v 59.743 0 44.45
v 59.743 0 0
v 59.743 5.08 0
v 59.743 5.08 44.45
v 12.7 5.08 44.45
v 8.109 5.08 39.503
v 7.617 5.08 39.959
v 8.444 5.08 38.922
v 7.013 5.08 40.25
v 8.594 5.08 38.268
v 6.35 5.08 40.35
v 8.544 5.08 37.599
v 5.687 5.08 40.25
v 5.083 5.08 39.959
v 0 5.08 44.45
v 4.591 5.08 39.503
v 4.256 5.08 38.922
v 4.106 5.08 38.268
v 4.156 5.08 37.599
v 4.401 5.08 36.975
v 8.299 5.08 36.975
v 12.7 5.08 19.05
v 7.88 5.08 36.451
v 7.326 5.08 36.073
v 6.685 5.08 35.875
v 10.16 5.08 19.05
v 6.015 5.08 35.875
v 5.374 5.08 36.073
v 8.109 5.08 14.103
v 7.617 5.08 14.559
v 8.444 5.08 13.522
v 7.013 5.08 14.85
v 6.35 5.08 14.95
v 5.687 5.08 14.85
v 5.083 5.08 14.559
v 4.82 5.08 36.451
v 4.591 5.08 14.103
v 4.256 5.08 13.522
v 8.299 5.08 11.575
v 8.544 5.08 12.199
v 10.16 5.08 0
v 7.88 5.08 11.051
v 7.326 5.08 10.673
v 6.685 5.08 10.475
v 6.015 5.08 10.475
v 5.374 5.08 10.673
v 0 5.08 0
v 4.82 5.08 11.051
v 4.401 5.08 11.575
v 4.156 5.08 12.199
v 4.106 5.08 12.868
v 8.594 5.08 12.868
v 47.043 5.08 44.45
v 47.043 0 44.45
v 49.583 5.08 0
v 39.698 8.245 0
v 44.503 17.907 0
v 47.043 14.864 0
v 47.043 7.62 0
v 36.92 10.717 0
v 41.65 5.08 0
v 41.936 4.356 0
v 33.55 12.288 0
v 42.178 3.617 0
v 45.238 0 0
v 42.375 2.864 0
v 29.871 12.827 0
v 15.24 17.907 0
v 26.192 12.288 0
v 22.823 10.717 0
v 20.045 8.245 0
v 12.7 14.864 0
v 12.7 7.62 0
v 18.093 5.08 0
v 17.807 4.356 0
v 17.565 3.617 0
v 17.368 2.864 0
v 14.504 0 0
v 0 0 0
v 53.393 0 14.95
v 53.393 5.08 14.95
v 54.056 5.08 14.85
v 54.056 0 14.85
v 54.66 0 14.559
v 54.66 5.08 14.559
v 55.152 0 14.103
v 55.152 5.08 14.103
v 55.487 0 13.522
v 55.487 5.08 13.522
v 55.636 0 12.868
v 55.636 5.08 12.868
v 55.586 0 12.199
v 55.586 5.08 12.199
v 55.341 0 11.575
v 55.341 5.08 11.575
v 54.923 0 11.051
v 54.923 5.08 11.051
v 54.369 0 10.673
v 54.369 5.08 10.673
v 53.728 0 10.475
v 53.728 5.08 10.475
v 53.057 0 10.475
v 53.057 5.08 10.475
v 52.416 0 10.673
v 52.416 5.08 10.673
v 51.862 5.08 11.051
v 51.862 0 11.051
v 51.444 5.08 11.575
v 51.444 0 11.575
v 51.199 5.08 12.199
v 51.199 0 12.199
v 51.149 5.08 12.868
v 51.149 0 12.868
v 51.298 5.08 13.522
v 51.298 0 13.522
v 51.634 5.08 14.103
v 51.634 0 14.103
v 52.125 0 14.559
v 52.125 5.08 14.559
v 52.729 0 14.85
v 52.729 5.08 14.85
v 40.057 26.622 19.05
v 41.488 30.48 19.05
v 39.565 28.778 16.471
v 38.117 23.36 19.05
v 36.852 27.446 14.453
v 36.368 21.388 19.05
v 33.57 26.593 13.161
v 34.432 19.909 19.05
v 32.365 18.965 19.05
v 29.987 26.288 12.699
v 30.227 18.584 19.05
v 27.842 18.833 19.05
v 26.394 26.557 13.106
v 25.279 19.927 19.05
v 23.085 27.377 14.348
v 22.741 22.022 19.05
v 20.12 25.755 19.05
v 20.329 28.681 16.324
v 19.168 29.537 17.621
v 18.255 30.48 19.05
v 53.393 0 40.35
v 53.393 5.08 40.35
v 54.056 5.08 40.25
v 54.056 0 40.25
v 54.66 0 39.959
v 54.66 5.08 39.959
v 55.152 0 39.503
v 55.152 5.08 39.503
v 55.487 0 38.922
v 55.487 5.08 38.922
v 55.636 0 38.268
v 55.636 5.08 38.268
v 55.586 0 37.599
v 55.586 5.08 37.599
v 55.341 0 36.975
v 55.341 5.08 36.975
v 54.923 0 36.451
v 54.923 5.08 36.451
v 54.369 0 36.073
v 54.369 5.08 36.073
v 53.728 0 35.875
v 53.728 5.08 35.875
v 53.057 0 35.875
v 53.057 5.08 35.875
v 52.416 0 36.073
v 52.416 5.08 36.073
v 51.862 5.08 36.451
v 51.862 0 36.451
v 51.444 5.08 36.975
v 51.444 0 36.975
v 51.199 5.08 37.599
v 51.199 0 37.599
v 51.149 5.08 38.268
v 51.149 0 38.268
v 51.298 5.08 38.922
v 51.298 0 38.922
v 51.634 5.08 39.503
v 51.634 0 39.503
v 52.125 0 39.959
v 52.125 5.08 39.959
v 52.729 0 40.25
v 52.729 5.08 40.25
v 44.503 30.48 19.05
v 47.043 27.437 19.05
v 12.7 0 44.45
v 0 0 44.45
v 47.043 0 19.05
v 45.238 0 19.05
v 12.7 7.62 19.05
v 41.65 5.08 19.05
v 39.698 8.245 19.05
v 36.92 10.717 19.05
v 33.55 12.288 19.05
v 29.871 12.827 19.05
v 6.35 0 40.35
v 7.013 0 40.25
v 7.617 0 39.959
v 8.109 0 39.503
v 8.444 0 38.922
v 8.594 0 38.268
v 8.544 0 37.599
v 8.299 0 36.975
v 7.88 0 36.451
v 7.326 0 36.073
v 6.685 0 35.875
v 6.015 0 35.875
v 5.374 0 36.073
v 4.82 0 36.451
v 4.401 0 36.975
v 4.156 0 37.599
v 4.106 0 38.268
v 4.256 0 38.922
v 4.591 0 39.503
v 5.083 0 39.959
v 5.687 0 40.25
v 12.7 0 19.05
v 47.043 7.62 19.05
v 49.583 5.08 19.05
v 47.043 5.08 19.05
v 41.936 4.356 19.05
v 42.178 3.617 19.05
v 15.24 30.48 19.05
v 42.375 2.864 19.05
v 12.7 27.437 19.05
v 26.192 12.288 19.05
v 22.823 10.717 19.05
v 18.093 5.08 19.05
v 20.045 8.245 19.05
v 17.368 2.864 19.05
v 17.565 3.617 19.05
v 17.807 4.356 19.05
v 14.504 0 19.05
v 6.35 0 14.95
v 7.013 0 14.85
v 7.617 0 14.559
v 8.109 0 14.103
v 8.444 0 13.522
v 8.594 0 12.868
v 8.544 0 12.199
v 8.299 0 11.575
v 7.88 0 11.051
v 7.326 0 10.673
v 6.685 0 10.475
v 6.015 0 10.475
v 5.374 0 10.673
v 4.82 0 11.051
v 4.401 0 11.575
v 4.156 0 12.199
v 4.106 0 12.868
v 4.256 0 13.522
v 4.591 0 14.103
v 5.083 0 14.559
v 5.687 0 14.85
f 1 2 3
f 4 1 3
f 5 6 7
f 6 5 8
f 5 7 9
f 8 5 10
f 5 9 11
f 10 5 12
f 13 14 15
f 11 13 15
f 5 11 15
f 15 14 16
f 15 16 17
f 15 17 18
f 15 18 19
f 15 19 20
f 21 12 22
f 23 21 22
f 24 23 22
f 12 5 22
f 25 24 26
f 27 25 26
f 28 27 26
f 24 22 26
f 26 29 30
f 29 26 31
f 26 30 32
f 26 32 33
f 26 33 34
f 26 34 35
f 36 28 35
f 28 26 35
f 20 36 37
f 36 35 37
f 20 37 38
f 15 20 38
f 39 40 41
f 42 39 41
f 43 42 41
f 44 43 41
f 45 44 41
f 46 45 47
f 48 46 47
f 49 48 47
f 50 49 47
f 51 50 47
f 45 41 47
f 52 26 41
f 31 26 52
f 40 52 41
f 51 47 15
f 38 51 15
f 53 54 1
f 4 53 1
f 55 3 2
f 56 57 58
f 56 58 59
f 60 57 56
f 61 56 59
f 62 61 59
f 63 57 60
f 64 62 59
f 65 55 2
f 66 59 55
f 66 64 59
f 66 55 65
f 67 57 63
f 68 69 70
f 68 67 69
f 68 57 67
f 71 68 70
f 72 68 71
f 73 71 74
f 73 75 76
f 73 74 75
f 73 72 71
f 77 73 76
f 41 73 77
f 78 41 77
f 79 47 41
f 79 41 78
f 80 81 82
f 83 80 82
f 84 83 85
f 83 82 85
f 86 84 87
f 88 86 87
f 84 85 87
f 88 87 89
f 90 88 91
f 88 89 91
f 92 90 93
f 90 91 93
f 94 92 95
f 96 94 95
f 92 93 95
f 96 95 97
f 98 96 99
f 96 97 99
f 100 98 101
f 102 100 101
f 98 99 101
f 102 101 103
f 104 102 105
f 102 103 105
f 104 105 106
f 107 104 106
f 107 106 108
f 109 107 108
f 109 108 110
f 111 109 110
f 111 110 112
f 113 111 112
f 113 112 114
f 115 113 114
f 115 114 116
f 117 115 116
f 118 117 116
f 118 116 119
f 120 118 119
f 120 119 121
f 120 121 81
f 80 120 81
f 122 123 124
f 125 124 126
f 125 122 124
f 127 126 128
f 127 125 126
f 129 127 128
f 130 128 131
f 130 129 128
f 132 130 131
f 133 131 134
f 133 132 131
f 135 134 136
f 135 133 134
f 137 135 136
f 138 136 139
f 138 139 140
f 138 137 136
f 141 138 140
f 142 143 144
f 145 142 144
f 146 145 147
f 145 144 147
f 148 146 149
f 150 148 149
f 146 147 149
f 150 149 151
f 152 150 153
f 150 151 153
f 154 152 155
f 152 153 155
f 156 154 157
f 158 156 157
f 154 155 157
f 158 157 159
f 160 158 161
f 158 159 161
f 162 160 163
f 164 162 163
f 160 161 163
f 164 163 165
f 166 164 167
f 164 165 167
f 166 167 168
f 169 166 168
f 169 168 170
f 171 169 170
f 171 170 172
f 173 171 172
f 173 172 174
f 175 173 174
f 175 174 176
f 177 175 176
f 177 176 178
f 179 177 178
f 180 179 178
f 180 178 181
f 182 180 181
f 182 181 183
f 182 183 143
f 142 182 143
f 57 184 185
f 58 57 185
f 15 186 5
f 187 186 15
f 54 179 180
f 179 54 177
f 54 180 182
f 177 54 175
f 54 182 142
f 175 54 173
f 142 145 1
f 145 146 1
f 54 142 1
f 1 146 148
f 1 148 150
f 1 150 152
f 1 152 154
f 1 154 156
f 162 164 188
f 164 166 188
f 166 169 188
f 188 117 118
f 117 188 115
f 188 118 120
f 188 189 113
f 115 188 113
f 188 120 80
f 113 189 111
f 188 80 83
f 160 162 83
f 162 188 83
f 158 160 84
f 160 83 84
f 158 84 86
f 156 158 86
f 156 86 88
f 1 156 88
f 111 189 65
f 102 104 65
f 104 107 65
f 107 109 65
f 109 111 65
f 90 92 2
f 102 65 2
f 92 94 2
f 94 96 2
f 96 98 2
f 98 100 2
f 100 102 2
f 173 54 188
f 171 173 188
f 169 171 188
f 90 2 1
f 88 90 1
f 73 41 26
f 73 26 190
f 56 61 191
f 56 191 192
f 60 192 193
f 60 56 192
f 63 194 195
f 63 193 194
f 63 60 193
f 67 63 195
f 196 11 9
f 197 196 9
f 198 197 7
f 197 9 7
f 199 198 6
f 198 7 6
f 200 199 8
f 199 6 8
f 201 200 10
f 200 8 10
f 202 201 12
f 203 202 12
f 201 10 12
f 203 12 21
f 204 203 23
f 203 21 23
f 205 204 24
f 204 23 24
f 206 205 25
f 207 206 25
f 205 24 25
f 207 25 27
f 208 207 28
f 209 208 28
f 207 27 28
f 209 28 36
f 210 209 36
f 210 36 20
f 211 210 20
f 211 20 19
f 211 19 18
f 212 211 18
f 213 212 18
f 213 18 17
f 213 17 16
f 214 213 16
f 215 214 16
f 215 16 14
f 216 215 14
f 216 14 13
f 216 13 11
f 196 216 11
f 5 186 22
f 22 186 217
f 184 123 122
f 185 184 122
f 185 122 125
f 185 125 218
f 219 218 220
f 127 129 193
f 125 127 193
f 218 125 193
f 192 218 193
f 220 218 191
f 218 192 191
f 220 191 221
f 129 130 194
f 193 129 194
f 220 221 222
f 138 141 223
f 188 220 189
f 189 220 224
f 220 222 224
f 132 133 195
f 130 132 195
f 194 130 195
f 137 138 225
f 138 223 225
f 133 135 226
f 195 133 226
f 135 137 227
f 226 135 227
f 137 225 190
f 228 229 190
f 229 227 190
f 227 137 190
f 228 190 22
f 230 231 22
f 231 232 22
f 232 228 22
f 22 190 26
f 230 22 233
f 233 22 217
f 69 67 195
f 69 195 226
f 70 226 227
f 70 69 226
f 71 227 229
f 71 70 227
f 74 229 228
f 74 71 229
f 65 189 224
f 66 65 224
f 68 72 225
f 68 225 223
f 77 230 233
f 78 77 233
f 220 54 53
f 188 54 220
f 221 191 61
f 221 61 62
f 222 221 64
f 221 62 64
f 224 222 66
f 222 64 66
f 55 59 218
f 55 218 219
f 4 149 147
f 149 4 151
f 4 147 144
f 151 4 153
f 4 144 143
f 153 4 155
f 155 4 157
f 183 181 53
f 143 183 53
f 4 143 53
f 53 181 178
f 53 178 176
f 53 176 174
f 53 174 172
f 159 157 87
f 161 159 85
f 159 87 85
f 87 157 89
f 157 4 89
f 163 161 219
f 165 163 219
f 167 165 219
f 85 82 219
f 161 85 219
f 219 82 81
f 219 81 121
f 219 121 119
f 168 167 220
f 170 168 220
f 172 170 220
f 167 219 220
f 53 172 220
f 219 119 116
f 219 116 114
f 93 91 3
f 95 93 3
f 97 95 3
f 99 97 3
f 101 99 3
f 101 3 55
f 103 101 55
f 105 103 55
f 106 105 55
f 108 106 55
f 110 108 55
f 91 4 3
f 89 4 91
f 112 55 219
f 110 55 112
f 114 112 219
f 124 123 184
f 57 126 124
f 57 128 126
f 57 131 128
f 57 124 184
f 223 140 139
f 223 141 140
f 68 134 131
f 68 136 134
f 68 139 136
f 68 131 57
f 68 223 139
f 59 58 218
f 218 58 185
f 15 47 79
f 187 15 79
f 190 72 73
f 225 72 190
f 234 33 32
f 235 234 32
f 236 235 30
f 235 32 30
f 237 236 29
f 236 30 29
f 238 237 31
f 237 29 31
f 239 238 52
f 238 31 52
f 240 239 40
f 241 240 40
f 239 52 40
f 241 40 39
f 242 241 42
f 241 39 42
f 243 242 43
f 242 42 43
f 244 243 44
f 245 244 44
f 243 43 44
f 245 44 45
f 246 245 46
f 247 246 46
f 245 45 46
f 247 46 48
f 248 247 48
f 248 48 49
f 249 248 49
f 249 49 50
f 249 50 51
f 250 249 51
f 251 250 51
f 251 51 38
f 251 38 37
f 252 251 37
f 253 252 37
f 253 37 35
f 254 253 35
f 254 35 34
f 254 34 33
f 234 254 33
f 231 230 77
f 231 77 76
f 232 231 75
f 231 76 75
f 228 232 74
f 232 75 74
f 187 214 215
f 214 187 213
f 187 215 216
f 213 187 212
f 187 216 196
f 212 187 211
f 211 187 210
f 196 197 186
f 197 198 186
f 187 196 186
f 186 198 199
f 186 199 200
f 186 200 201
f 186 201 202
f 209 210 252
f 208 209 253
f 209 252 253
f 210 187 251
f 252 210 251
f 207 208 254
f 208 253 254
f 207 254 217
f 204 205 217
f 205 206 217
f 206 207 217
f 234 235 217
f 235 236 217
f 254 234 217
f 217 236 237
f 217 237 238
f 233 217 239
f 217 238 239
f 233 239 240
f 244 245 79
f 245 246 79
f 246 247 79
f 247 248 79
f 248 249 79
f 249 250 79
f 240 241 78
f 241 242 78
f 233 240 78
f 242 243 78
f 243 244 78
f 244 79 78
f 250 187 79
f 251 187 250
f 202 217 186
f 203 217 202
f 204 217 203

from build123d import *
from build123d.topology import SkipClean

# Parameters (mm, degrees)
BOSS_EXTRUDE1_DEPTH     = 50.8
SKETCH2_R               = 2.25
SKETCH2_R_2             = 2.2500000000000004
SKETCH2_R_3             = 2.2499999999999964
SKETCH2_R_4             = 2.250000000000002
CUT_EXTRUDE2_DEPTH      = 80.4629164554471
CUT_EXTRUDE4_DEPTH      = 80.4629164554471
CUT_EXTRUDE4_DEPTH_BACK = 80.4629164554471
SKETCH7_W               = 34.34264107490862
SKETCH7_H               = 6.349999999999994
SKETCH7_H_2             = 25.4
SKETCH7_W_2             = 12.699999999999996
BOSS_EXTRUDE3_START     = 12.7
BOSS_EXTRUDE3_DEPTH     = 34.342641075
CUT_EXTRUDE5_DEPTH      = 81.46127057538526
CUT_EXTRUDE5_DEPTH_BACK = 81.46127057538526
CAVITY1_START           = -12.110223167
CAVITY1_DEPTH           = 25.933177896
CHAMFER5_SIZE           = 2.54


with BuildPart() as part:
    # Sketch1 → Boss-Extrude1 (new body)
    with BuildSketch(Plane.XY):
        with BuildLine():
            Line((0, 5.08), (0, 0))
            Line((0, 0), (11.964320537454306, 0))
            ThreePointArc((11.964320537454306, 2.19e-15), (12.149194735731278, 2.56649684743677), (12.700000000000003, 5.080000000000005))
            Line((12.7, 5.08), (0, 5.08))
        make_face()
        with BuildLine():
            ThreePointArc((12.700000000000003, 5.080000000000005), (12.149194735731278, 2.56649684743677), (11.964320537454306, 2.19e-15))
            Line((11.964320537454306, 0), (17.044320537454304, 0))
            ThreePointArc((17.044320537454304, 1.57e-15), (20.80126185517433, 9.070058682279722), (29.871320537453954, 12.827000000000004))
            Line((29.871320537454306, 12.827000000000004), (29.871320537454306, 17.907))
            ThreePointArc((29.871320537454306, 17.907), (19.154672530731307, 14.34622265615587), (12.700000000000003, 5.080000000000005))
        make_face()
        with BuildLine():
            Line((42.69832053745431, 0), (47.778320537454306, 0))
            ThreePointArc((47.778320537454306, 0), (47.59344633917733, 2.56649684743677), (47.042641074908616, 5.079999999999999))
            ThreePointArc((47.042641074908616, 5.079999999999999), (40.5879685441773, 14.34622265615587), (29.871320537454306, 17.907))
            Line((29.871320537454306, 17.907), (29.871320537454306, 12.827000000000004))
            ThreePointArc((29.871320537453954, 12.827000000000004), (38.94137921973403, 9.070058682279972), (42.69832053745431, 0))
        make_face()
        with BuildLine():
            ThreePointArc((47.042641074908616, 5.079999999999999), (47.59344633917733, 2.56649684743677), (47.778320537454306, 0))
            Line((47.778320537454306, 0), (59.74264107490861, 0))
            Line((59.74264107490861, 0), (59.74264107490861, 5.08))
            Line((59.74264107490861, 5.08), (47.042641074908616, 5.08))
        make_face()
    extrude(amount=BOSS_EXTRUDE1_DEPTH)

    # Sketch2 → Cut-Extrude2 (cut, through all)
    with BuildSketch(Plane(origin=(0, 5.08, 0), x_dir=(1, 0, 0), z_dir=(0, 1, 0))):
        with Locations(Location((6.349999999999999, -12.7, 0), (0, 0, 270))):
            Circle(SKETCH2_R)
        with Locations(Location((6.350000000000002, -38.10000000000001, 0), (0, 0, 270))):
            Circle(SKETCH2_R_2)
        with Locations(Location((53.392641074908624, -38.1, 0), (0, 0, 270))):
            Circle(SKETCH2_R_3)
        with Locations(Location((53.39264107490862, -12.699999999999994, 0), (0, 0, 270))):
            Circle(SKETCH2_R_4)
    extrude(amount=-CUT_EXTRUDE2_DEPTH, mode=Mode.SUBTRACT)

    # Sketch7 → Cut-Extrude4 (cut, two sides: drawn at the far end of the back side and taken through both)
    with BuildSketch(Plane(origin=(0, 5.08, 0), x_dir=(1, 0, 0), z_dir=(0, 1, 0)).offset(-CUT_EXTRUDE4_DEPTH_BACK)):
        Polygon((0, -50.8), (12.700000000000001, -50.8), (12.7, -44.449999999999996), (0, -44.449999999999996), align=None)
        with Locations((29.871320537454306, -47.62499999999999)):
            Rectangle(SKETCH7_W, SKETCH7_H)
        with Locations((29.871320537454306, -31.749999999999996)):
            Rectangle(SKETCH7_W, SKETCH7_H_2)
        with Locations((53.39264107490861, -47.62499999999999)):
            Rectangle(SKETCH7_W_2, SKETCH7_H)
    extrude(amount=CUT_EXTRUDE4_DEPTH + CUT_EXTRUDE4_DEPTH_BACK, mode=Mode.SUBTRACT)

    # Sketch8 → Boss-Extrude3 (add)
    with BuildSketch(Plane(origin=(0, 0, 0), x_dir=(0, 0, -1), z_dir=(1, 0, 0)).offset(BOSS_EXTRUDE3_START)):
        Polygon((-19.049999999999997, 5.0799999999999965), (-19.049999999999994, 30.479999999999997), (0, 17.907), (0, 5.079999999999999), align=None)
    extrude(amount=BOSS_EXTRUDE3_DEPTH)

    # Sketch1<4> → Cut-Extrude5 (cut, two sides: drawn at the far end of the back side and taken through both)
    with SkipClean():  # the faces are left unmerged after this step: merging them gives an invalid solid
        with BuildSketch(Plane.XY.offset(-CUT_EXTRUDE5_DEPTH_BACK)):
            with BuildLine():
                ThreePointArc((29.871320537453954, 12.827000000000004), (20.80126185517433, 9.070058682279722), (17.044320537454304, 1.57e-15))
                Line((17.044320537454304, 0), (29.871320537454306, 0))
                Line((29.871320537454306, 0), (29.871320537454306, 12.827000000000004))
            make_face()
            with BuildLine():
                Line((29.871320537454306, 0), (17.044320537454304, 0))
                ThreePointArc((17.044320537454304, 1.57e-15), (29.871320537454302, -12.827000000000004), (42.69832053745431, -3.14e-15))
                ThreePointArc((42.69832053745431, 0), (38.94137921973403, 9.070058682279972), (29.871320537453954, 12.827000000000004))
                Line((29.871320537454306, 12.827000000000004), (29.871320537454306, 0))
            make_face()
        extrude(amount=CUT_EXTRUDE5_DEPTH + CUT_EXTRUDE5_DEPTH_BACK, mode=Mode.SUBTRACT)

    # Cavity1: read off the stored shape, not the designer's step
    # Cavity1 outline → Cavity1 (cut)
    with SkipClean():  # the faces are left unmerged after this step: merging them gives an invalid solid
        with BuildSketch(Plane(origin=(0, 0, 0), x_dir=(1, 0, 0), z_dir=(0, 0.7719302356170498, -0.6357072528610997)).offset(CAVITY1_START)):
            with BuildLine():
                Line((42.335603858, -36), (41.488040544, -34.081628056))
                ThreePointArc((41.488040544, -34.081628056), (29.871320538, -26.514055969), (18.254600531, -34.081628056))
                Line((18.254600531, -34.081628056), (17.407037217, -36))
                Line((17.407037217, -36), (42.335603858, -36))
            make_face()
        extrude(amount=CAVITY1_DEPTH, mode=Mode.SUBTRACT)

    # Chamfer5
    # the kernel refuses this chamfer: 2.54 mm, written as the material it adds along each edge
    with BuildSketch(Plane(origin=(12.700000000000003, 5.080000000000004, 0), x_dir=(-1, -1.4e-15, 0), z_dir=(0, 0, 1))) as chamfer5_piece_1:
        Polygon((CHAMFER5_SIZE, 0), (0, -CHAMFER5_SIZE), (0, 0), align=None)
    extrude(amount=19.049999999999997)
    with BuildSketch(Plane(origin=(47.042641074908616, 5.08, 0), x_dir=(3.598031758927257e-11, 1.0, 0), z_dir=(0, 0, 1))) as chamfer5_piece_2:
        Polygon((CHAMFER5_SIZE, 0), (9.139001e-11, -CHAMFER5_SIZE), (0, 0), align=None)
    extrude(amount=19.049999999999997)
    # the kernel refuses this chamfer: 2.54 mm, written as the material it takes off along each edge
    with BuildSketch(Plane(origin=(42.69832053745431, -1.3e-16, -7.4053740903902145), x_dir=(1, 5e-17, 0), z_dir=(0, 0, 1))) as chamfer5_2_piece_1:
        with BuildLine():
            Line((CHAMFER5_SIZE, 0), (-0.3237705210766462, 2.863770521075717))
            ThreePointArc((-0.3237705210766462, 2.863770521075717), (-0.08576469637885246, 1.4808281256642715), (0, 0))
            Line((0, 0), (CHAMFER5_SIZE, 0))
        make_face()
    extrude(amount=33.860748180780426, mode=Mode.SUBTRACT)
    with BuildSketch(Plane(origin=(17.044320537454304, 7.9e-16, -7.405374090390225), x_dir=(0.11234172985080312, 0.9936696310817439, 0), z_dir=(0, 0, 1))) as chamfer5_2_piece_2:
        with BuildLine():
            Line((2.882014737592532, 1e-17), (-CHAMFER5_SIZE * 0.112341729851, CHAMFER5_SIZE * 0.993669631082))
            Line((-CHAMFER5_SIZE * 0.112341729851, CHAMFER5_SIZE * 0.993669631082), (0, 0))
            ThreePointArc((0, 0), (1.4810888916756169, 0.0811370190382275), (2.882014737592532, 1e-17))
        make_face()
    extrude(amount=33.86074818078045, mode=Mode.SUBTRACT)
    with BuildSketch(Plane(origin=(47.042641075000006, 34.07814250199304, 24.501731063625822), x_dir=(-1, 6.4e-16, -4.2e-16), z_dir=(0, -0.5508422083307387, -0.8346094065617252))) as chamfer5_2_piece_3:
        Polygon((CHAMFER5_SIZE, 0), (-1.96e-15, -CHAMFER5_SIZE), (0, 0), align=None)
    extrude(amount=35.889197859210064, mode=Mode.SUBTRACT)
    with BuildSketch(Plane(origin=(12.7, 34.07814250199304, 24.50173106362582), x_dir=(0, -0.8346094065617252, 0.5508422083307387), z_dir=(0, -0.5508422083307387, -0.8346094065617252))) as chamfer5_2_piece_4:
        Polygon((CHAMFER5_SIZE, 0), (0, -CHAMFER5_SIZE), (0, 0), align=None)
    extrude(amount=35.88919785921006, mode=Mode.SUBTRACT)


solid = part.part
